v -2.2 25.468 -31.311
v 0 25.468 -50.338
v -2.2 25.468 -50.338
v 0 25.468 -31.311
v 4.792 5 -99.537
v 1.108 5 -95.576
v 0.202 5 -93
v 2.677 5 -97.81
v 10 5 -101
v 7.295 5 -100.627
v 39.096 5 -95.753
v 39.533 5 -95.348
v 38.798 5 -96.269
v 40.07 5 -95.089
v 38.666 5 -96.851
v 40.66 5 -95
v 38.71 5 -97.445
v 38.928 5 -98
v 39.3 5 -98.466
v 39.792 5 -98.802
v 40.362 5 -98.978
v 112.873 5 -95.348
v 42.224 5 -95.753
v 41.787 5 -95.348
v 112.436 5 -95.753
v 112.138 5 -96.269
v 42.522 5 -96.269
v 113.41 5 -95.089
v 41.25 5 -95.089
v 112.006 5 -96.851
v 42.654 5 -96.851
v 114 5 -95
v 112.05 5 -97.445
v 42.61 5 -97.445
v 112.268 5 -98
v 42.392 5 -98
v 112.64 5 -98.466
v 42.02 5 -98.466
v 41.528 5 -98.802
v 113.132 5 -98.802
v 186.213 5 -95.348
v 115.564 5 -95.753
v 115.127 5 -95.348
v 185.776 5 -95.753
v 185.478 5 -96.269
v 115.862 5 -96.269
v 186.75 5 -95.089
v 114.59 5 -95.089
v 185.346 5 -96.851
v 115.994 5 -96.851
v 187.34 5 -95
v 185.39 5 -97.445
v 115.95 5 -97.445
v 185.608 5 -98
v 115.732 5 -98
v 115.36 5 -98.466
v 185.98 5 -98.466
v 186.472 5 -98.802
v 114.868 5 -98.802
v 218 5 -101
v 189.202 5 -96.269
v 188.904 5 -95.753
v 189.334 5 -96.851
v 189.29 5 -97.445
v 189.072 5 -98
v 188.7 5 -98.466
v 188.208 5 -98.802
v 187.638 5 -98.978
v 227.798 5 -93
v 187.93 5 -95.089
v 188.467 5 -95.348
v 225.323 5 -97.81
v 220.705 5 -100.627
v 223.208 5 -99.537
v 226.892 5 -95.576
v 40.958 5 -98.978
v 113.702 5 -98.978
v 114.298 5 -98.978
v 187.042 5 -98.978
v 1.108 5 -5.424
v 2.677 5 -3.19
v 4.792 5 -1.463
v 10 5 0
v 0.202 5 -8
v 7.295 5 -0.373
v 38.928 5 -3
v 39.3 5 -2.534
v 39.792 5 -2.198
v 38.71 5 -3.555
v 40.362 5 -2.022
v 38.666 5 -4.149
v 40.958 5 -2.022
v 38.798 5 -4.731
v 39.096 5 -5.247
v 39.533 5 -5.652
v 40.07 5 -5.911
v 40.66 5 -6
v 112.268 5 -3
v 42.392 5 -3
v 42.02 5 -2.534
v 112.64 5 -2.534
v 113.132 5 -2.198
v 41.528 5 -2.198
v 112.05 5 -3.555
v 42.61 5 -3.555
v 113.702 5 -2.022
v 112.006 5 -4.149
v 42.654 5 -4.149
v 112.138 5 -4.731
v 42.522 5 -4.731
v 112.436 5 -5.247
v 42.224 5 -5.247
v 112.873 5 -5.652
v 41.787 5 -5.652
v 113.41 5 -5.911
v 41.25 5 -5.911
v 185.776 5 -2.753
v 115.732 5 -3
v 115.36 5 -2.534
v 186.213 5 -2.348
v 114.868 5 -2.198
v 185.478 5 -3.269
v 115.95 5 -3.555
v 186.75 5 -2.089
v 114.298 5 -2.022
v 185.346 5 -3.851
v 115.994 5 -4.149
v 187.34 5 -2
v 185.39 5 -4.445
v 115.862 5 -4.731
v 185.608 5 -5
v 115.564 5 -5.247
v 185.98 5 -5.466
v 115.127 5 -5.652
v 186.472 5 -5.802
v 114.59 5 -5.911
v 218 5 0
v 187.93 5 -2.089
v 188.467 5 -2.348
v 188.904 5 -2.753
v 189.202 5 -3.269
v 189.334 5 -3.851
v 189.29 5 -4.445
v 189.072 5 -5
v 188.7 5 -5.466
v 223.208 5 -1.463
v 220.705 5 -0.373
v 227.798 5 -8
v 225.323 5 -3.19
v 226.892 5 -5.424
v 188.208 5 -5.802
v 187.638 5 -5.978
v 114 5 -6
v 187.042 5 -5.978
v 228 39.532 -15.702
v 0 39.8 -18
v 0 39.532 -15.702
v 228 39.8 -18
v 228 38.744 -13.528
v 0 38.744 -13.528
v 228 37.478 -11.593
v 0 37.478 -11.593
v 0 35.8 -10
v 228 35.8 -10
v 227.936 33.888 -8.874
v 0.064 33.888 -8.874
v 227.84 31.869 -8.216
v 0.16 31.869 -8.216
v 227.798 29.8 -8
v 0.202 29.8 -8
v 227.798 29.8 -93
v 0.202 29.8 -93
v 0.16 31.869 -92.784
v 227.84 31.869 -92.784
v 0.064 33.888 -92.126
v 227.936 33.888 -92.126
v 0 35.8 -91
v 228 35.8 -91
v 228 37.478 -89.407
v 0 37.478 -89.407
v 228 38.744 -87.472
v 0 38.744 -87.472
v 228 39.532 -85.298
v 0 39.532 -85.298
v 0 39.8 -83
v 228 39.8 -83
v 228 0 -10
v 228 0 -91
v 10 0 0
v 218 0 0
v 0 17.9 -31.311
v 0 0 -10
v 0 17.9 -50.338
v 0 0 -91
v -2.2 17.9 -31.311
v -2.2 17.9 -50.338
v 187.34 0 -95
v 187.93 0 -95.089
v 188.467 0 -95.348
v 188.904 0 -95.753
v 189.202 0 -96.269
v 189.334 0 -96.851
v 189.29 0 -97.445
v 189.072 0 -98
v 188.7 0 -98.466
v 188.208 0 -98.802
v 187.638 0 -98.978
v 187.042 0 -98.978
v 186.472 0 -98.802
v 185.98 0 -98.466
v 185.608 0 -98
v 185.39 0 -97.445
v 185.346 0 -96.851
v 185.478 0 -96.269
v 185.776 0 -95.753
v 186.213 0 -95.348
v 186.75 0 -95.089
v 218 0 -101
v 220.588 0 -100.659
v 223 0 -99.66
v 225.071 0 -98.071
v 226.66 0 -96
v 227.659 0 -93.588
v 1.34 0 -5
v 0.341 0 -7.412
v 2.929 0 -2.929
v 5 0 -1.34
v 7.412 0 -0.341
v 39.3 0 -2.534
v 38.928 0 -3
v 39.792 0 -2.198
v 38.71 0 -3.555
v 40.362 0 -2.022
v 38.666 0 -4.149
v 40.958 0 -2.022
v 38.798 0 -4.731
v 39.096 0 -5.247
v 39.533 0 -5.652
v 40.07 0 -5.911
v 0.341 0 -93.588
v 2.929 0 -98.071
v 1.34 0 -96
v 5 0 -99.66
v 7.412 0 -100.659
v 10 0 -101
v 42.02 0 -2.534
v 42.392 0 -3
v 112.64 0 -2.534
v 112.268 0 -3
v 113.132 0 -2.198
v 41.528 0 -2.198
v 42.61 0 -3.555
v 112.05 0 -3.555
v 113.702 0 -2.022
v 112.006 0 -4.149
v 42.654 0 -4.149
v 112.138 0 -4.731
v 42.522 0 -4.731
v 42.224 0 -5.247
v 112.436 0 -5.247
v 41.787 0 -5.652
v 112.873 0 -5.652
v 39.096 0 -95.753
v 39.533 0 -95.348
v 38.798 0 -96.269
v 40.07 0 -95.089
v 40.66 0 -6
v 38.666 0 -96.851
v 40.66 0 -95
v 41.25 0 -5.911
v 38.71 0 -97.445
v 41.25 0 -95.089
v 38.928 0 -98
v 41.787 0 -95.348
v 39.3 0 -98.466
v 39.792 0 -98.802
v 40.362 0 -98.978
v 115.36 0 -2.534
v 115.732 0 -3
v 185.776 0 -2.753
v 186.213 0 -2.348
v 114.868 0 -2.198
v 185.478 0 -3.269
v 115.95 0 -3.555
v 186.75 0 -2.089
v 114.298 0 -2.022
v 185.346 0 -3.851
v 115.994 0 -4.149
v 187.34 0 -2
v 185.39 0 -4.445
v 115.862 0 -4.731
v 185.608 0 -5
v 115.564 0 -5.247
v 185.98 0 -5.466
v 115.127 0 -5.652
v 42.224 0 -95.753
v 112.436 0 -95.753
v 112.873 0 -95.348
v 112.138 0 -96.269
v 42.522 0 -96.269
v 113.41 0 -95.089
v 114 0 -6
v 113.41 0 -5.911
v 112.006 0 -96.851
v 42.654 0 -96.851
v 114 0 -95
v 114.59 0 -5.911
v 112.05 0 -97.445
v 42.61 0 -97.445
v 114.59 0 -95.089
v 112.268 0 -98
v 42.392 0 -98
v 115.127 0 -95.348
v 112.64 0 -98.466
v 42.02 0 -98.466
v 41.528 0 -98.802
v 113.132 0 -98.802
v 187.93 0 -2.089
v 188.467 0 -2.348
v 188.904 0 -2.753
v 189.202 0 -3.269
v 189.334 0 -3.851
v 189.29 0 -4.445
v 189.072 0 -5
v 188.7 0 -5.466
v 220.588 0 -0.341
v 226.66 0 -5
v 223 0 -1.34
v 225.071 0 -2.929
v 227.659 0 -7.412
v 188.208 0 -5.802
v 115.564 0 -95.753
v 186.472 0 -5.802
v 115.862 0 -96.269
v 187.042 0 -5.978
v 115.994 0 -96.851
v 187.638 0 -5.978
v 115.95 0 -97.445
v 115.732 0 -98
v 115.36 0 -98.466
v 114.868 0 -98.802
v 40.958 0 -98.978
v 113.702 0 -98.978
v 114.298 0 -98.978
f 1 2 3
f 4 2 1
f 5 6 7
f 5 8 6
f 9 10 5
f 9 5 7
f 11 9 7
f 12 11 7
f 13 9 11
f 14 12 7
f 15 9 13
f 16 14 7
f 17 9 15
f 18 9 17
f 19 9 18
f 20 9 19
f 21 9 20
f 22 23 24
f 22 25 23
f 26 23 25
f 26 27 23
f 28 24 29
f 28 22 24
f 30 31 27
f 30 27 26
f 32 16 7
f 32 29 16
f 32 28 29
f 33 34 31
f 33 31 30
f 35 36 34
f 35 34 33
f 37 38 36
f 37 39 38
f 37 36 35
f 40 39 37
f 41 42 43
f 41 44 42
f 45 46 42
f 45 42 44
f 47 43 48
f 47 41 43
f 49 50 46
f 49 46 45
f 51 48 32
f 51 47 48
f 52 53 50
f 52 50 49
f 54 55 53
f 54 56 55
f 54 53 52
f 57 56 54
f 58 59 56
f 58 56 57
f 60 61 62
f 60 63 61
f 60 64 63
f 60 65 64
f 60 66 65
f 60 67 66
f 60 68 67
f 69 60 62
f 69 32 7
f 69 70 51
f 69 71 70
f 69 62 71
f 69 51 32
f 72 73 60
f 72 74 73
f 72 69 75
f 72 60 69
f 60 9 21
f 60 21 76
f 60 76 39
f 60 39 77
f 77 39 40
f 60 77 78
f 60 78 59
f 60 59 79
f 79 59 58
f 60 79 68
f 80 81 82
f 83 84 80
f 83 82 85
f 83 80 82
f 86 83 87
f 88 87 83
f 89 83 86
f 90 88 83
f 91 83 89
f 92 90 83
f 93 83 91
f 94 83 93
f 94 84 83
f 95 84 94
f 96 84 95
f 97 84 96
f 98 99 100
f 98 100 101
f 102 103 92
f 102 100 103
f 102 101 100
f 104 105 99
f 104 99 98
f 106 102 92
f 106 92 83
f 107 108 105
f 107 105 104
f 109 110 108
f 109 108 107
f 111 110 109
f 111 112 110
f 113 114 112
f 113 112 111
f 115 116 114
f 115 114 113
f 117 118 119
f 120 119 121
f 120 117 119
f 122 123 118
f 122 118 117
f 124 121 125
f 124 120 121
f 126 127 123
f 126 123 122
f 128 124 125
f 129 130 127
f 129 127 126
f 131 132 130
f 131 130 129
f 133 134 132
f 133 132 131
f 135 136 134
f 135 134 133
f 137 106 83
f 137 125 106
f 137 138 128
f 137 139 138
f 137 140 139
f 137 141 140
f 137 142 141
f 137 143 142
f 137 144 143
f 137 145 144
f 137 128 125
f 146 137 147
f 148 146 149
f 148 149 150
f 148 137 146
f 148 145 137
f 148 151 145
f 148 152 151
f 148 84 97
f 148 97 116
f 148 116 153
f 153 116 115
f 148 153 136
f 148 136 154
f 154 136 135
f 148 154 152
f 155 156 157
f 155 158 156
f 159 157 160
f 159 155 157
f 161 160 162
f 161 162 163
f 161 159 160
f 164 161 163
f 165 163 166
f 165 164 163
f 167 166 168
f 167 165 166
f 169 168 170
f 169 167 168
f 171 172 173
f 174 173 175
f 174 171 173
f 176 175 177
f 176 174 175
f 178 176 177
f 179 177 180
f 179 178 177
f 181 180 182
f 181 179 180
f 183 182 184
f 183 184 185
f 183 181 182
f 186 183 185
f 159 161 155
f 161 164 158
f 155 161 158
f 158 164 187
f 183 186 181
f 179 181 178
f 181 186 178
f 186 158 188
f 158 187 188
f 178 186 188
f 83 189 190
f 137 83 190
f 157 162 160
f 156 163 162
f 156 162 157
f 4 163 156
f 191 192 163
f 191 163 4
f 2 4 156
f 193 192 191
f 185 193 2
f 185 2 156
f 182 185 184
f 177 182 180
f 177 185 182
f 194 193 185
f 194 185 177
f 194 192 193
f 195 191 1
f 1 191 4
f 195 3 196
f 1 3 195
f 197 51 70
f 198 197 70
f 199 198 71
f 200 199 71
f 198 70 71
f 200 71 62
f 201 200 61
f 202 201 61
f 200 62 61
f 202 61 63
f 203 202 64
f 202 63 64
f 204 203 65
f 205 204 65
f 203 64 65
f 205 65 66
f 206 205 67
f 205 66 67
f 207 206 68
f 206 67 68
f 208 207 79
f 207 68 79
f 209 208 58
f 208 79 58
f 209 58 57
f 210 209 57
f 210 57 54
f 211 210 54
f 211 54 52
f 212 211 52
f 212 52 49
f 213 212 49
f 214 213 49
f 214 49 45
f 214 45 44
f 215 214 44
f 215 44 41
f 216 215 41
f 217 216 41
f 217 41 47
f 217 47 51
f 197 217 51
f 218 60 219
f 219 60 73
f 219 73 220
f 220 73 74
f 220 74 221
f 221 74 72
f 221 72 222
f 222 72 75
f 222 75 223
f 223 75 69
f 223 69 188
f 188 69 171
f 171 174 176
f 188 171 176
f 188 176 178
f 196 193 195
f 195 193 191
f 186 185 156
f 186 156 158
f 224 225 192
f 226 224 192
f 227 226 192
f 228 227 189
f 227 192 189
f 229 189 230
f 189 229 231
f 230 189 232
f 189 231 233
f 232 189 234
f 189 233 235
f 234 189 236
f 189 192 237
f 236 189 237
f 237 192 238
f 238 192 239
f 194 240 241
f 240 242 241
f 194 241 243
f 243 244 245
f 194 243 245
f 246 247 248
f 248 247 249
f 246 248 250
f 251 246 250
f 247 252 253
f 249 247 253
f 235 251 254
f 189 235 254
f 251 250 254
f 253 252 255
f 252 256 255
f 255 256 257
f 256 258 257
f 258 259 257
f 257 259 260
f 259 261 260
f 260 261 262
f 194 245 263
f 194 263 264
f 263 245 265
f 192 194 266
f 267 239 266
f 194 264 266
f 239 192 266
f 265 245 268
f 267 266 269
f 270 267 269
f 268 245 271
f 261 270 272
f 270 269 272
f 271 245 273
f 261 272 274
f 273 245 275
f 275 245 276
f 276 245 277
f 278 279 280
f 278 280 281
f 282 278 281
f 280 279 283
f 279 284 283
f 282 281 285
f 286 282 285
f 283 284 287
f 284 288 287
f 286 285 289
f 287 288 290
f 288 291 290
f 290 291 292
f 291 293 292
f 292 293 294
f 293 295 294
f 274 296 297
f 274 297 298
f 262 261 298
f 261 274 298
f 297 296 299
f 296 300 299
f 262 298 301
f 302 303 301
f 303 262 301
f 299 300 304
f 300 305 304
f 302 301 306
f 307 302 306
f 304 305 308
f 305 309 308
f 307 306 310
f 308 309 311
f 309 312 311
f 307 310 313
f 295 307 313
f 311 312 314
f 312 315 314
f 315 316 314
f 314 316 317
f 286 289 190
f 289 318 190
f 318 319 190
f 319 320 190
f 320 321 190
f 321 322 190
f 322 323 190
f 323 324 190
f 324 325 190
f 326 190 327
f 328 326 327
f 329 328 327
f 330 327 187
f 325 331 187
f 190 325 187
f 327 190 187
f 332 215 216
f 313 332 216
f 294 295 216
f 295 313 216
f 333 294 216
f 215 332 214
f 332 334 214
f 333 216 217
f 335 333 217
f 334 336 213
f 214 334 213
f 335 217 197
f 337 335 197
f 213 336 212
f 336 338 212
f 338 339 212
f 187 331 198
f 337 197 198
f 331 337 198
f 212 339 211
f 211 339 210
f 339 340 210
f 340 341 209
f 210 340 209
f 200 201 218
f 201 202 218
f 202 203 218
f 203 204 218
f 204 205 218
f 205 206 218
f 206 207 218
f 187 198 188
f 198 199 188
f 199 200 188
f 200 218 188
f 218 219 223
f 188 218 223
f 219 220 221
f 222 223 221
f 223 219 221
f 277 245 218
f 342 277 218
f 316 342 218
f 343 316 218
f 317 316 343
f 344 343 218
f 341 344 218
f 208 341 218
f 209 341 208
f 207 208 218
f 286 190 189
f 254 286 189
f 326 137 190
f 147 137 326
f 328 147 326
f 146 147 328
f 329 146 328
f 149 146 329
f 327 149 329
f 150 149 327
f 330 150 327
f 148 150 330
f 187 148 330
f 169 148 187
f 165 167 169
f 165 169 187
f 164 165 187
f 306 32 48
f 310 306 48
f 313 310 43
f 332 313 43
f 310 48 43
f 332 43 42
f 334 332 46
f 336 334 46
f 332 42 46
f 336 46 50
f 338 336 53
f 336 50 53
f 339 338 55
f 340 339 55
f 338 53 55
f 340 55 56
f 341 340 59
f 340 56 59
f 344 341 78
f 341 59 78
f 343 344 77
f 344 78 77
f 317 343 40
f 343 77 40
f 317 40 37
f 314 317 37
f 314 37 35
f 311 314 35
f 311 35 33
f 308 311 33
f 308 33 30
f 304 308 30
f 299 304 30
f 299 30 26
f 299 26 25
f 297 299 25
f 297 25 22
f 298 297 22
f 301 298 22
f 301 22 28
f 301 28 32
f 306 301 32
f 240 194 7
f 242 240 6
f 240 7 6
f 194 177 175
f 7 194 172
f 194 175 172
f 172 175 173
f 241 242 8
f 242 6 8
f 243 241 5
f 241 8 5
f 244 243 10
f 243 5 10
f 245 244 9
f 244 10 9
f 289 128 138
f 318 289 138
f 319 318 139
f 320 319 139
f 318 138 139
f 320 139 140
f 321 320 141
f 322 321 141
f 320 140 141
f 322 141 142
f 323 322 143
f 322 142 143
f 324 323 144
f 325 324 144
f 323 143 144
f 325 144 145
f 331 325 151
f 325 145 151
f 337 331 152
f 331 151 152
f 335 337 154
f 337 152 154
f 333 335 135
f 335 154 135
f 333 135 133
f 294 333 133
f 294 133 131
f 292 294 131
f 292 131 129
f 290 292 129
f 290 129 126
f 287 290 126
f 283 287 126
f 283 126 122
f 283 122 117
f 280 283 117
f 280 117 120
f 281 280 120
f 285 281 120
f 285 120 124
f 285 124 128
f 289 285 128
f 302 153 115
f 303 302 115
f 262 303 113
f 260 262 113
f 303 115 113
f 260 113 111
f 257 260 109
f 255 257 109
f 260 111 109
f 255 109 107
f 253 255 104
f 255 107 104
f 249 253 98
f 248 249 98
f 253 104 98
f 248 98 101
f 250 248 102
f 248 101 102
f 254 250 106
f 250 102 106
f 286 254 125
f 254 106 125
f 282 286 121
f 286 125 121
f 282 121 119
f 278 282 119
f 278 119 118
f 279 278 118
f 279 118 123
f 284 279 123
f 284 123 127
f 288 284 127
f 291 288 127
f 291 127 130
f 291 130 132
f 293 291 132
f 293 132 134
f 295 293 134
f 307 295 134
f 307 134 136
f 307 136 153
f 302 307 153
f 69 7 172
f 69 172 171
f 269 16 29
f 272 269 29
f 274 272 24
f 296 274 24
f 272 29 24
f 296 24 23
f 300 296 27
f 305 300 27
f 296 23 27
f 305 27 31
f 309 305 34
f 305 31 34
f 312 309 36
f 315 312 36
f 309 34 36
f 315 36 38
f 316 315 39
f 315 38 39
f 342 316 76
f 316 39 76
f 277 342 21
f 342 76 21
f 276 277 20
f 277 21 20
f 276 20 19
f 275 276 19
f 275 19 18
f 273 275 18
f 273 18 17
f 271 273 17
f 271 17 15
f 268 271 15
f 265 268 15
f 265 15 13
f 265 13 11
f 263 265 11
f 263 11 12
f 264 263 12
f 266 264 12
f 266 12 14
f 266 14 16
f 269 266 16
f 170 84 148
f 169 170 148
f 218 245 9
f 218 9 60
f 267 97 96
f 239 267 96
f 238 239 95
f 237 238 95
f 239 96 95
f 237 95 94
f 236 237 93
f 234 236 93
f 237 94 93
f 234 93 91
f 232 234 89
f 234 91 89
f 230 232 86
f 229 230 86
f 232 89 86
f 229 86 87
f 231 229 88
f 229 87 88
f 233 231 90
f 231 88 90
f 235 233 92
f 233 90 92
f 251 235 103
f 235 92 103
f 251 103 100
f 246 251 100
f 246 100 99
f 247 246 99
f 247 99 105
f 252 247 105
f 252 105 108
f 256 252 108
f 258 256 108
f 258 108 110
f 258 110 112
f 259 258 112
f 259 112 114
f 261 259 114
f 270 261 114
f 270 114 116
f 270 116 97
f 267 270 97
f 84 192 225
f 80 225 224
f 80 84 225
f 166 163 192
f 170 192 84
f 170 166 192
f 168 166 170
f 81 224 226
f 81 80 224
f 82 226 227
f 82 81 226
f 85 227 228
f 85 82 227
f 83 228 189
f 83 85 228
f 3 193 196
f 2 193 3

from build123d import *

# Parameters (mm, degrees)
SKETCH1_W           = 228
SKETCH1_H           = 101
BOSS_EXTRUDE1_DEPTH = 5
SKETCH2_R           = 2
CUT_EXTRUDE1_DEPTH  = 250.419325635
SKETCH3_W           = 228
SKETCH3_H           = 85
BOSS_EXTRUDE2_DEPTH = 34.8
SKETCH4_W           = 19.026867748
SKETCH4_H           = 7.567504218
BOSS_EXTRUDE3_DEPTH = 2.2
FILLET1_R           = 10


with BuildPart() as part:
    # Sketch1 → Boss-Extrude1 (new body)
    with BuildSketch(Plane(origin=(0, 0, 0), x_dir=(1, 0, 0), z_dir=(0, 1, 0))):
        with Locations((114, 50.5)):
            Rectangle(SKETCH1_W, SKETCH1_H)
    extrude(amount=BOSS_EXTRUDE1_DEPTH)

    # Sketch2 → Cut-Extrude1 (cut, through all)
    with BuildSketch(Plane(origin=(0, 5, 0), x_dir=(1, 0, 0), z_dir=(0, 1, 0))):
        with Locations((187.34, 97)):
            Circle(SKETCH2_R)
        with Locations((187.34, 4)):
            Circle(SKETCH2_R)
        with Locations((114, 97)):
            Circle(SKETCH2_R)
        with Locations((40.66, 97)):
            Circle(SKETCH2_R)
        with Locations((114, 4)):
            Circle(SKETCH2_R)
        with Locations((40.66, 4)):
            Circle(SKETCH2_R)
    extrude(amount=-CUT_EXTRUDE1_DEPTH, mode=Mode.SUBTRACT)

    # Sketch3 → Boss-Extrude2 (add)
    with BuildSketch(Plane(origin=(0, 5, 0), x_dir=(1, 0, 0), z_dir=(0, 1, 0))):
        with Locations((114, 50.5)):
            Rectangle(SKETCH3_W, SKETCH3_H)
    extrude(amount=BOSS_EXTRUDE2_DEPTH)

    # Sketch4 → Boss-Extrude3 (add)
    with BuildSketch(Plane.ZY):
        with Locations((-40.824405321, 21.683781351)):
            Rectangle(SKETCH4_W, SKETCH4_H)
    extrude(amount=BOSS_EXTRUDE3_DEPTH)

    # Fillet1
    fillet1_edges = [part.edges().sort_by_distance(p)[0] for p in [
        (0, 2.5, 0),
    ]]
    fillet(fillet1_edges, radius=FILLET1_R)
    fillet1_2_edges = [part.edges().sort_by_distance(p)[0] for p in [
        (228, 2.5, 0),
    ]]
    fillet(fillet1_2_edges, radius=FILLET1_R)
    fillet1_3_edges = [part.edges().sort_by_distance(p)[0] for p in [
        (0, 2.5, -101),
    ]]
    fillet(fillet1_3_edges, radius=FILLET1_R)
    fillet1_4_edges = [part.edges().sort_by_distance(p)[0] for p in [
        (228, 2.5, -101),
    ]]
    fillet(fillet1_4_edges, radius=FILLET1_R)
    fillet1_5_edges = [part.edges().sort_by_distance(p)[0] for p in [
        (114, 39.8, -93),
    ]]
    fillet(fillet1_5_edges, radius=FILLET1_R)
    fillet1_6_edges = [part.edges().sort_by_distance(p)[0] for p in [
        (114, 39.8, -8),
    ]]
    fillet(fillet1_6_edges, radius=FILLET1_R)


solid = part.part
